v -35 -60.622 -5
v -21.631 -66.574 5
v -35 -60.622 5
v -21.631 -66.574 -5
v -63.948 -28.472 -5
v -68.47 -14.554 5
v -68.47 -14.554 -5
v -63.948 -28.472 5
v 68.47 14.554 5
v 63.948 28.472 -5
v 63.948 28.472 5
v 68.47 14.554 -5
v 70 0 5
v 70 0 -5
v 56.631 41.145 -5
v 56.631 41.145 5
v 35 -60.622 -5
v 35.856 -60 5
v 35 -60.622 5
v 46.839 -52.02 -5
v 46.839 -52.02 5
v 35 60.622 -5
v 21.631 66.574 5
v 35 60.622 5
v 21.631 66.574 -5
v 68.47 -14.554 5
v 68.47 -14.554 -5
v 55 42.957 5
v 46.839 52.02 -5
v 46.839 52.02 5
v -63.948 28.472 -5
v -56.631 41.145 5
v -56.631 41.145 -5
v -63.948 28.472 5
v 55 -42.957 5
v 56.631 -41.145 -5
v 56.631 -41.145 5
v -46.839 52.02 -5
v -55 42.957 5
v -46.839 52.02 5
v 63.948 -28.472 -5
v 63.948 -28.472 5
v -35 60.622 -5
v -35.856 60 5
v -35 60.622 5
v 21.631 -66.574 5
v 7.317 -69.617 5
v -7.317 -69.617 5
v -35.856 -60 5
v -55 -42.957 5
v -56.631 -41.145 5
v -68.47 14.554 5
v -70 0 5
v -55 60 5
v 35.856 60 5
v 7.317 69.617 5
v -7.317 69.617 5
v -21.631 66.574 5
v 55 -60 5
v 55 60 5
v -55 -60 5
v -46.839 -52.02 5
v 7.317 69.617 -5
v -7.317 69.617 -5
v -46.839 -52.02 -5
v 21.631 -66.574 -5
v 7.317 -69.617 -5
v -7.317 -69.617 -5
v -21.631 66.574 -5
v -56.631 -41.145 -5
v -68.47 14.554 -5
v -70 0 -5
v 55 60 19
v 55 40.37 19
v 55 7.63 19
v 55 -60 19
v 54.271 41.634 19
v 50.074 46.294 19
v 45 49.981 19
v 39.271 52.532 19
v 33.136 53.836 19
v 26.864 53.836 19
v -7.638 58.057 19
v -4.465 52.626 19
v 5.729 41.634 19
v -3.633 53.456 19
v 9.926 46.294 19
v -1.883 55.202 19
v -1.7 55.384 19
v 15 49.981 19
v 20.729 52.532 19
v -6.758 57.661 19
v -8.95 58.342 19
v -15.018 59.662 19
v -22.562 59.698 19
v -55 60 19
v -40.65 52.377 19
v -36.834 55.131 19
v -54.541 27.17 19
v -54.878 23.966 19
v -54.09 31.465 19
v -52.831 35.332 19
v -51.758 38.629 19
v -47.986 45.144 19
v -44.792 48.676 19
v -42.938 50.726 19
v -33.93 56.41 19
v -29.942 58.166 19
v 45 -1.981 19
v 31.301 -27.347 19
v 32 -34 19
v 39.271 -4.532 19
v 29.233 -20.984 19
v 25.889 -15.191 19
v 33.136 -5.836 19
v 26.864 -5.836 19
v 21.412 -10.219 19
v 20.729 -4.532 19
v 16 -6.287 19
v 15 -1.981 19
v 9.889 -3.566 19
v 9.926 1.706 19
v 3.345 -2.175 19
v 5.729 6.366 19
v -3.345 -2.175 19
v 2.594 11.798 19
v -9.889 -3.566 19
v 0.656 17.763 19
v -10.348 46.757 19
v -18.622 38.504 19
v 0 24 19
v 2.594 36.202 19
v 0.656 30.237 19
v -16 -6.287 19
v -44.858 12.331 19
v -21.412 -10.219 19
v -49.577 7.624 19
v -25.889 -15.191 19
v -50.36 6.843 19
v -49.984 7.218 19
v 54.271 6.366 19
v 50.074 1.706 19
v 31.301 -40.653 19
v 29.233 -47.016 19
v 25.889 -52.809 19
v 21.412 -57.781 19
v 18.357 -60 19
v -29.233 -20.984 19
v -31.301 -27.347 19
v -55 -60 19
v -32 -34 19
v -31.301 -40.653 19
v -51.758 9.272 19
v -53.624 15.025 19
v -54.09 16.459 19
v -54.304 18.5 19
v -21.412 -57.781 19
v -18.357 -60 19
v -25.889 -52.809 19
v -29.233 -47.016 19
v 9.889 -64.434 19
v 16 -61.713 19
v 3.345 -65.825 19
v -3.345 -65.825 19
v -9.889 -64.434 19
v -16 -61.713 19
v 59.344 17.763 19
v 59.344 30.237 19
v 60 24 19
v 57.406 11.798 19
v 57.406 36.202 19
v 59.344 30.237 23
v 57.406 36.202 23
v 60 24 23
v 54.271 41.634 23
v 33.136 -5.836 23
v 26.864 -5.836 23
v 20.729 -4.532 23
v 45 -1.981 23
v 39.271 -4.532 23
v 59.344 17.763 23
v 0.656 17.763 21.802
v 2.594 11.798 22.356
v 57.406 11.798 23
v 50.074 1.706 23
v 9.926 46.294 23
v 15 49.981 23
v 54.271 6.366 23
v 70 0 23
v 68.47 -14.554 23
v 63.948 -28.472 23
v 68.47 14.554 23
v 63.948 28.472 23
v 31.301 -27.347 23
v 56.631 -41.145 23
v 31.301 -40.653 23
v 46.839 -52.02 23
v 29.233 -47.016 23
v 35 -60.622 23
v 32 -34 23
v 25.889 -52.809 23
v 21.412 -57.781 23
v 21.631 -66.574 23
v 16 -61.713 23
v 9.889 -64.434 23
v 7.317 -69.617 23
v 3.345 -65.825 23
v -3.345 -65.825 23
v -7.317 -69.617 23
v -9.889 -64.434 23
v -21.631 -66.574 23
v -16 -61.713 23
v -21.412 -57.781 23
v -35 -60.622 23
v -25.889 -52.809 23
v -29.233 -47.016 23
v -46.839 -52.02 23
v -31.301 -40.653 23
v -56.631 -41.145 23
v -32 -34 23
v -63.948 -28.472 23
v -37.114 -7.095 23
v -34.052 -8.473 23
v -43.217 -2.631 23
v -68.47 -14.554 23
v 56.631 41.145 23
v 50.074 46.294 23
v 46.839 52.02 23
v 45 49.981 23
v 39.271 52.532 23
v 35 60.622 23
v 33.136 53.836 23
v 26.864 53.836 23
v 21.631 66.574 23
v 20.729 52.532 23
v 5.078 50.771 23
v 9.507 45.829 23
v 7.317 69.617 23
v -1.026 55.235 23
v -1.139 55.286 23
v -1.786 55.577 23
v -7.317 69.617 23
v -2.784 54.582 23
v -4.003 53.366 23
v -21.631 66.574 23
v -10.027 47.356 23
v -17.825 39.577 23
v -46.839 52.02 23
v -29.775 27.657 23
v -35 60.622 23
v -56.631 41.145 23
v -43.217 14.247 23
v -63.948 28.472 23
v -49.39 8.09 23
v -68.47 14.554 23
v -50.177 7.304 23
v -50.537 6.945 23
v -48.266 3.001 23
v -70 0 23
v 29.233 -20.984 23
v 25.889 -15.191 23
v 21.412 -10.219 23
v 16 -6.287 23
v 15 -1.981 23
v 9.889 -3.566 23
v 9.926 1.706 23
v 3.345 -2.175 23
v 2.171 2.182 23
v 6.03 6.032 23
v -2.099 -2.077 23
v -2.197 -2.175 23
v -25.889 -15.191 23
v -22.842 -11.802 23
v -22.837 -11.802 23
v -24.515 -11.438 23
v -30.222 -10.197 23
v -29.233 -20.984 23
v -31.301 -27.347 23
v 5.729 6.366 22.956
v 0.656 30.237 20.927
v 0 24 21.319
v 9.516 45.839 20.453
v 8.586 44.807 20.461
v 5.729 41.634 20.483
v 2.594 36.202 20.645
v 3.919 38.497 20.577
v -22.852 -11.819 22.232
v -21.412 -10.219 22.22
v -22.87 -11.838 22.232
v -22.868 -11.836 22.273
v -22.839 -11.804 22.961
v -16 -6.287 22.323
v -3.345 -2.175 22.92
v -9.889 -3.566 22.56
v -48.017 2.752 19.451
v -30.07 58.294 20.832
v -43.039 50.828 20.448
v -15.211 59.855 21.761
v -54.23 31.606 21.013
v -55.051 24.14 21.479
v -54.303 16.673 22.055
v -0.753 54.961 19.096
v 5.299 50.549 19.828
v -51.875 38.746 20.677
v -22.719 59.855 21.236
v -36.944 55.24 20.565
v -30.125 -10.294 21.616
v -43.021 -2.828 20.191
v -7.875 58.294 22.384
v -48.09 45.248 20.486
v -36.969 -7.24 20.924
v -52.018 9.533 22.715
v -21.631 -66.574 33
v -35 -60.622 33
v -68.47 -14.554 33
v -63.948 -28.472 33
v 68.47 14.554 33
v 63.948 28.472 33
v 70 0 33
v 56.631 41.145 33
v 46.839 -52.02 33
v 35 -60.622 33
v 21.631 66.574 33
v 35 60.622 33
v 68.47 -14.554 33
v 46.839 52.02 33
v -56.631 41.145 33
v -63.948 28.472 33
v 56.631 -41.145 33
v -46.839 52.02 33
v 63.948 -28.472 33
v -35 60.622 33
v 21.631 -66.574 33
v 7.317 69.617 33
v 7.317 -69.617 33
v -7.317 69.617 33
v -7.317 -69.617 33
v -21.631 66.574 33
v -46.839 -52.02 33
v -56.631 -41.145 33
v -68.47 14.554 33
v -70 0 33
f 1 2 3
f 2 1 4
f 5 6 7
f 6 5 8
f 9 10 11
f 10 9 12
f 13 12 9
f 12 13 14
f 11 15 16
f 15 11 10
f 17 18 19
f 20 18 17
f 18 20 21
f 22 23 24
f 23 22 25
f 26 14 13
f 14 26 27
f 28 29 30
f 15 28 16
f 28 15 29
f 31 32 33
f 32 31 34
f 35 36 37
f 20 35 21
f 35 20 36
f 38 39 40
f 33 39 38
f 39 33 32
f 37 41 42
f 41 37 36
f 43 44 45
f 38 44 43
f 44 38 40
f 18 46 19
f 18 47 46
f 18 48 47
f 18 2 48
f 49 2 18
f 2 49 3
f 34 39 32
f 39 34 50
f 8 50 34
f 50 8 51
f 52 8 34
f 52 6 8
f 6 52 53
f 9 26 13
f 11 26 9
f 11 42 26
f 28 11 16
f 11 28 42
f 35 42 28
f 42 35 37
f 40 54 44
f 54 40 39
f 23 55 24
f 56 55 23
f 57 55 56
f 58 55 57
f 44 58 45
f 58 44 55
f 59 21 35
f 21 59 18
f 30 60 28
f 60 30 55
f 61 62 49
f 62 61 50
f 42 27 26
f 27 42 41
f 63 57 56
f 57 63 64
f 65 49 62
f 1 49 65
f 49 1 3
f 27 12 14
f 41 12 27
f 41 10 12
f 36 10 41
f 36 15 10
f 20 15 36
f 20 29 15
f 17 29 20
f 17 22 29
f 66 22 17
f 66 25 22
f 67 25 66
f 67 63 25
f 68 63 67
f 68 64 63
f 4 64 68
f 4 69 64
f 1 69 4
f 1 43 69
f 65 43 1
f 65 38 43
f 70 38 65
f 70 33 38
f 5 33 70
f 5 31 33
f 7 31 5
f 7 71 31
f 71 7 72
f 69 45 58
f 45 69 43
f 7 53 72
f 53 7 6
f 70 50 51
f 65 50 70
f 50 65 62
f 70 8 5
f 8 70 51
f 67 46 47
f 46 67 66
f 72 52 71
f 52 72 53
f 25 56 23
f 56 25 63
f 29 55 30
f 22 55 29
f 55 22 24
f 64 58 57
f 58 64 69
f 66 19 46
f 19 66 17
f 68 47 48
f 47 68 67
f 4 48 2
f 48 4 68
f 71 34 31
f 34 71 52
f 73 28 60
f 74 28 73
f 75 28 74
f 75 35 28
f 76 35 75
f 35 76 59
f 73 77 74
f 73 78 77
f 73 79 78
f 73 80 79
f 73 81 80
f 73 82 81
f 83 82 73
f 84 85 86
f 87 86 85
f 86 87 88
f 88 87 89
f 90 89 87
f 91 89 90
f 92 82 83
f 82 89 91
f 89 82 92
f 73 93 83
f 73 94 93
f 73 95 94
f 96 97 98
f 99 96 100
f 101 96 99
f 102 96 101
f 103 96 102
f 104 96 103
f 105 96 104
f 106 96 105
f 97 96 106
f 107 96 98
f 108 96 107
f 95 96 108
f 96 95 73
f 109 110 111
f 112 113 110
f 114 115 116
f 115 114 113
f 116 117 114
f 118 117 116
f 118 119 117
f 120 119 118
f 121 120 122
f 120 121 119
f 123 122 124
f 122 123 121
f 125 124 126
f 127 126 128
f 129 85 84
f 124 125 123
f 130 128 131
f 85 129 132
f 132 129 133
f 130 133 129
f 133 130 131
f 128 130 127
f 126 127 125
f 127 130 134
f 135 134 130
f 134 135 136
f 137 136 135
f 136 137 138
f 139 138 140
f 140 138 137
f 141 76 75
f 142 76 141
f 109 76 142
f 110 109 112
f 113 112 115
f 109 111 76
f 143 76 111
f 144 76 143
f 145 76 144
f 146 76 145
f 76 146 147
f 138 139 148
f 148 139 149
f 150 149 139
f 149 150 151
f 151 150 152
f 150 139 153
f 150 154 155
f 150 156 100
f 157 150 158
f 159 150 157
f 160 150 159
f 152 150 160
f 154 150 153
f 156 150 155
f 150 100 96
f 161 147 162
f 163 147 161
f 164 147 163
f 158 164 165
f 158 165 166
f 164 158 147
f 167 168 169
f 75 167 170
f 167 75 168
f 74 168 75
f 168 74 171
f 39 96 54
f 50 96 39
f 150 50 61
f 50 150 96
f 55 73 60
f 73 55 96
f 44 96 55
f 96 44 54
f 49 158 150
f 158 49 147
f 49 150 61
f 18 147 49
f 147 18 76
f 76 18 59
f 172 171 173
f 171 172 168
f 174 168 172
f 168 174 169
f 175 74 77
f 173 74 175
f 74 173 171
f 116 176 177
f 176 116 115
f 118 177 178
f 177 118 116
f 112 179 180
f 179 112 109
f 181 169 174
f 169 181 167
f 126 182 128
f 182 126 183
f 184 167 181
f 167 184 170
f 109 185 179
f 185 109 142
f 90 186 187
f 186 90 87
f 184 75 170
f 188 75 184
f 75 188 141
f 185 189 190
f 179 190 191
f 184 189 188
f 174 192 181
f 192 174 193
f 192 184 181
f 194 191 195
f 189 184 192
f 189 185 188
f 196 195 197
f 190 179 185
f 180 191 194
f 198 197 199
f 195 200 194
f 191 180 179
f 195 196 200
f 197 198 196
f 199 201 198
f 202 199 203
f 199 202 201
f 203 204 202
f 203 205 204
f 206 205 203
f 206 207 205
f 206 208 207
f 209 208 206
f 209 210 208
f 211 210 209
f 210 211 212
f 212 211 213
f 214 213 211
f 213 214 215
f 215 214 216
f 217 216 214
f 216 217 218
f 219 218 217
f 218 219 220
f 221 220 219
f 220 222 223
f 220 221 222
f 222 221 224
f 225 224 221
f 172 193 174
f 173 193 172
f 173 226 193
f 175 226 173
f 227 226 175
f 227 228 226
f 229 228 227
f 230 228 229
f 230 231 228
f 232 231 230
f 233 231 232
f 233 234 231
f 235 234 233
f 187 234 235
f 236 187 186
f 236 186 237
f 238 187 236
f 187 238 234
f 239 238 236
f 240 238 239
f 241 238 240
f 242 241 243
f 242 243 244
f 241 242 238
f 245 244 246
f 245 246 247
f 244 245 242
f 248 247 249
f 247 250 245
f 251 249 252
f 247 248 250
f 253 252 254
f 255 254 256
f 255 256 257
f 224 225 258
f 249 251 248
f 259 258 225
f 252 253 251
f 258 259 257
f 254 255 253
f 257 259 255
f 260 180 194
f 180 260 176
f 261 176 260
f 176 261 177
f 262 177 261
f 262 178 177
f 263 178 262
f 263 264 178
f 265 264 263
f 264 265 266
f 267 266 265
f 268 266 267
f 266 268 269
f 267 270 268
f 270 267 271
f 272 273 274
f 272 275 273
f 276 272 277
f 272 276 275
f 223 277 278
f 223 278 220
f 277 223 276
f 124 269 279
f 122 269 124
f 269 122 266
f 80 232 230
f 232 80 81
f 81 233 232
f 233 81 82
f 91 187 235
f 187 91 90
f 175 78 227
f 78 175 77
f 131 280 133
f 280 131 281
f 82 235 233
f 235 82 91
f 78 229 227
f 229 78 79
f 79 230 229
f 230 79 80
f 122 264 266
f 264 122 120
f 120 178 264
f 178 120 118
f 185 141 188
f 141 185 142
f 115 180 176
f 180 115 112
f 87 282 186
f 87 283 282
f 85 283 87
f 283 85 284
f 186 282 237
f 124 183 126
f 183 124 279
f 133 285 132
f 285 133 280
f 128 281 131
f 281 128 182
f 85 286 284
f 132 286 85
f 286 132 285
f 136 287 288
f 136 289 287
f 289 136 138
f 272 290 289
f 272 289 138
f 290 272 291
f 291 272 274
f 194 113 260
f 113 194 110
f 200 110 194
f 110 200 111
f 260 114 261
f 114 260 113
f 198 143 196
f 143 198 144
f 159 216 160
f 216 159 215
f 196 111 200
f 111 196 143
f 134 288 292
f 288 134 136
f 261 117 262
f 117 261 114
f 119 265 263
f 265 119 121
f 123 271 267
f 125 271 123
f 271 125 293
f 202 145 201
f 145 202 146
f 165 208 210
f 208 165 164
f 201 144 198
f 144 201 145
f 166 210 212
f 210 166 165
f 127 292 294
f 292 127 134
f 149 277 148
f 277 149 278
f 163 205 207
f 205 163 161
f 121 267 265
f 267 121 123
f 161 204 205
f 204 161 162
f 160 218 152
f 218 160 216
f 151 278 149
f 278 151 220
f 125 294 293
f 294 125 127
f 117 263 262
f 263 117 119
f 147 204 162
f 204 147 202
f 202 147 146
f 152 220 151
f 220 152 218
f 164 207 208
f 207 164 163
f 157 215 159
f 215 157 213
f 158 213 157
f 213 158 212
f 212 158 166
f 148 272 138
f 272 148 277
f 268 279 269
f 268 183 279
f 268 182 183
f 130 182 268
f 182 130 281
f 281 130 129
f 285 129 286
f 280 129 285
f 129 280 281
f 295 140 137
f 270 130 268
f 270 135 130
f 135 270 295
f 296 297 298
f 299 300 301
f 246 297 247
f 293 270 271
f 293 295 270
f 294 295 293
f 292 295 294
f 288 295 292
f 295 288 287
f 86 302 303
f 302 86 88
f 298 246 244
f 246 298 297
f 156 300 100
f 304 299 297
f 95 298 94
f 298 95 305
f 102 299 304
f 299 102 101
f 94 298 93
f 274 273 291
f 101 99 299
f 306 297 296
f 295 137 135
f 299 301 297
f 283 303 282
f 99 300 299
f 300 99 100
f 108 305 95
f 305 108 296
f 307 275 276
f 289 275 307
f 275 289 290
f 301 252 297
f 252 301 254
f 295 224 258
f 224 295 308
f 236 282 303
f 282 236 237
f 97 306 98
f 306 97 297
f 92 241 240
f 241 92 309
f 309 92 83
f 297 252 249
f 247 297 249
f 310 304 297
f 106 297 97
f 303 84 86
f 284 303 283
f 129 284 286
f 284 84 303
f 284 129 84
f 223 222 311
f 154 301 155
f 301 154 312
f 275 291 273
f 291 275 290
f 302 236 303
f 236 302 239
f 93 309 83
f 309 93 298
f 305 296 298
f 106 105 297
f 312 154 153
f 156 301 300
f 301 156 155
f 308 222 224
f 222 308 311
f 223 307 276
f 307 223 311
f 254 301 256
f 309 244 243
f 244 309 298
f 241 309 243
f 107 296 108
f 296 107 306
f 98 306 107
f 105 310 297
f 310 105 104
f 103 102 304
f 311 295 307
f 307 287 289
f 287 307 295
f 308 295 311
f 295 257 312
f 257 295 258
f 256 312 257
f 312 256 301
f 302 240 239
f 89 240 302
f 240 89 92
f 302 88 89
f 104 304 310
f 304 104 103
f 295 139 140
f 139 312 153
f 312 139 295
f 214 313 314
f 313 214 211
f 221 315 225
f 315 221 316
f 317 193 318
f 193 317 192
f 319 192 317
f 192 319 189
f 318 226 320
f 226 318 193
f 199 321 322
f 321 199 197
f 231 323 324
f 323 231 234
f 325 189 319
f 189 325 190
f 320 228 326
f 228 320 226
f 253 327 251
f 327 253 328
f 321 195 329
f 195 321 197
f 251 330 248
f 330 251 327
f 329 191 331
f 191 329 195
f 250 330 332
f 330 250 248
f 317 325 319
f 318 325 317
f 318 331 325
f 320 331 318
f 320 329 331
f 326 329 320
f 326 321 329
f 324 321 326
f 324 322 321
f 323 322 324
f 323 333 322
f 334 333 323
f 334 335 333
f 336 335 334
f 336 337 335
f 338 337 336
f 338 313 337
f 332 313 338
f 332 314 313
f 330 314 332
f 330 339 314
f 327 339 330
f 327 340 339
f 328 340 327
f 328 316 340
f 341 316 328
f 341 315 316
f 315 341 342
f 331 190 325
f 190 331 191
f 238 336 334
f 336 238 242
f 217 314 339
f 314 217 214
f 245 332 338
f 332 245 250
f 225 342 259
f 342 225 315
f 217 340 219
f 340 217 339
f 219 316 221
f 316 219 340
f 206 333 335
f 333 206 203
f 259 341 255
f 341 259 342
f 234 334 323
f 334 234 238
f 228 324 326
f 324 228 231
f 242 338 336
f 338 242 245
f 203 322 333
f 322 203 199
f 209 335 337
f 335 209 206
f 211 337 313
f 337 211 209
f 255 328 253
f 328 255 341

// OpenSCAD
// creating a hamburger, albeit blocky
// on second thought, since I haven't learned how to round anything... a muffin? with halloumi

// bottom bun
cylinder(h=10, r=70, center=true);
// halloumi
translate([0, 0, 12])
    cube([110,120,14],center=true);
// tomato slices? what does one put on a cube and cylinder muffin?
translate([30, 24, 21])
    cylinder(h=4, r=30, center=true);
translate([0, -34, 21])
    cylinder(h=4, r=32, center=true);
translate([-19, 24, 22])
    rotate([-4, -4, 0])
    cylinder(h=4, r=36, center=true);
// I'm done. top bun now. boring muffin
translate([0, 0, 28])
    cylinder(h=10, r=70, center=true);
